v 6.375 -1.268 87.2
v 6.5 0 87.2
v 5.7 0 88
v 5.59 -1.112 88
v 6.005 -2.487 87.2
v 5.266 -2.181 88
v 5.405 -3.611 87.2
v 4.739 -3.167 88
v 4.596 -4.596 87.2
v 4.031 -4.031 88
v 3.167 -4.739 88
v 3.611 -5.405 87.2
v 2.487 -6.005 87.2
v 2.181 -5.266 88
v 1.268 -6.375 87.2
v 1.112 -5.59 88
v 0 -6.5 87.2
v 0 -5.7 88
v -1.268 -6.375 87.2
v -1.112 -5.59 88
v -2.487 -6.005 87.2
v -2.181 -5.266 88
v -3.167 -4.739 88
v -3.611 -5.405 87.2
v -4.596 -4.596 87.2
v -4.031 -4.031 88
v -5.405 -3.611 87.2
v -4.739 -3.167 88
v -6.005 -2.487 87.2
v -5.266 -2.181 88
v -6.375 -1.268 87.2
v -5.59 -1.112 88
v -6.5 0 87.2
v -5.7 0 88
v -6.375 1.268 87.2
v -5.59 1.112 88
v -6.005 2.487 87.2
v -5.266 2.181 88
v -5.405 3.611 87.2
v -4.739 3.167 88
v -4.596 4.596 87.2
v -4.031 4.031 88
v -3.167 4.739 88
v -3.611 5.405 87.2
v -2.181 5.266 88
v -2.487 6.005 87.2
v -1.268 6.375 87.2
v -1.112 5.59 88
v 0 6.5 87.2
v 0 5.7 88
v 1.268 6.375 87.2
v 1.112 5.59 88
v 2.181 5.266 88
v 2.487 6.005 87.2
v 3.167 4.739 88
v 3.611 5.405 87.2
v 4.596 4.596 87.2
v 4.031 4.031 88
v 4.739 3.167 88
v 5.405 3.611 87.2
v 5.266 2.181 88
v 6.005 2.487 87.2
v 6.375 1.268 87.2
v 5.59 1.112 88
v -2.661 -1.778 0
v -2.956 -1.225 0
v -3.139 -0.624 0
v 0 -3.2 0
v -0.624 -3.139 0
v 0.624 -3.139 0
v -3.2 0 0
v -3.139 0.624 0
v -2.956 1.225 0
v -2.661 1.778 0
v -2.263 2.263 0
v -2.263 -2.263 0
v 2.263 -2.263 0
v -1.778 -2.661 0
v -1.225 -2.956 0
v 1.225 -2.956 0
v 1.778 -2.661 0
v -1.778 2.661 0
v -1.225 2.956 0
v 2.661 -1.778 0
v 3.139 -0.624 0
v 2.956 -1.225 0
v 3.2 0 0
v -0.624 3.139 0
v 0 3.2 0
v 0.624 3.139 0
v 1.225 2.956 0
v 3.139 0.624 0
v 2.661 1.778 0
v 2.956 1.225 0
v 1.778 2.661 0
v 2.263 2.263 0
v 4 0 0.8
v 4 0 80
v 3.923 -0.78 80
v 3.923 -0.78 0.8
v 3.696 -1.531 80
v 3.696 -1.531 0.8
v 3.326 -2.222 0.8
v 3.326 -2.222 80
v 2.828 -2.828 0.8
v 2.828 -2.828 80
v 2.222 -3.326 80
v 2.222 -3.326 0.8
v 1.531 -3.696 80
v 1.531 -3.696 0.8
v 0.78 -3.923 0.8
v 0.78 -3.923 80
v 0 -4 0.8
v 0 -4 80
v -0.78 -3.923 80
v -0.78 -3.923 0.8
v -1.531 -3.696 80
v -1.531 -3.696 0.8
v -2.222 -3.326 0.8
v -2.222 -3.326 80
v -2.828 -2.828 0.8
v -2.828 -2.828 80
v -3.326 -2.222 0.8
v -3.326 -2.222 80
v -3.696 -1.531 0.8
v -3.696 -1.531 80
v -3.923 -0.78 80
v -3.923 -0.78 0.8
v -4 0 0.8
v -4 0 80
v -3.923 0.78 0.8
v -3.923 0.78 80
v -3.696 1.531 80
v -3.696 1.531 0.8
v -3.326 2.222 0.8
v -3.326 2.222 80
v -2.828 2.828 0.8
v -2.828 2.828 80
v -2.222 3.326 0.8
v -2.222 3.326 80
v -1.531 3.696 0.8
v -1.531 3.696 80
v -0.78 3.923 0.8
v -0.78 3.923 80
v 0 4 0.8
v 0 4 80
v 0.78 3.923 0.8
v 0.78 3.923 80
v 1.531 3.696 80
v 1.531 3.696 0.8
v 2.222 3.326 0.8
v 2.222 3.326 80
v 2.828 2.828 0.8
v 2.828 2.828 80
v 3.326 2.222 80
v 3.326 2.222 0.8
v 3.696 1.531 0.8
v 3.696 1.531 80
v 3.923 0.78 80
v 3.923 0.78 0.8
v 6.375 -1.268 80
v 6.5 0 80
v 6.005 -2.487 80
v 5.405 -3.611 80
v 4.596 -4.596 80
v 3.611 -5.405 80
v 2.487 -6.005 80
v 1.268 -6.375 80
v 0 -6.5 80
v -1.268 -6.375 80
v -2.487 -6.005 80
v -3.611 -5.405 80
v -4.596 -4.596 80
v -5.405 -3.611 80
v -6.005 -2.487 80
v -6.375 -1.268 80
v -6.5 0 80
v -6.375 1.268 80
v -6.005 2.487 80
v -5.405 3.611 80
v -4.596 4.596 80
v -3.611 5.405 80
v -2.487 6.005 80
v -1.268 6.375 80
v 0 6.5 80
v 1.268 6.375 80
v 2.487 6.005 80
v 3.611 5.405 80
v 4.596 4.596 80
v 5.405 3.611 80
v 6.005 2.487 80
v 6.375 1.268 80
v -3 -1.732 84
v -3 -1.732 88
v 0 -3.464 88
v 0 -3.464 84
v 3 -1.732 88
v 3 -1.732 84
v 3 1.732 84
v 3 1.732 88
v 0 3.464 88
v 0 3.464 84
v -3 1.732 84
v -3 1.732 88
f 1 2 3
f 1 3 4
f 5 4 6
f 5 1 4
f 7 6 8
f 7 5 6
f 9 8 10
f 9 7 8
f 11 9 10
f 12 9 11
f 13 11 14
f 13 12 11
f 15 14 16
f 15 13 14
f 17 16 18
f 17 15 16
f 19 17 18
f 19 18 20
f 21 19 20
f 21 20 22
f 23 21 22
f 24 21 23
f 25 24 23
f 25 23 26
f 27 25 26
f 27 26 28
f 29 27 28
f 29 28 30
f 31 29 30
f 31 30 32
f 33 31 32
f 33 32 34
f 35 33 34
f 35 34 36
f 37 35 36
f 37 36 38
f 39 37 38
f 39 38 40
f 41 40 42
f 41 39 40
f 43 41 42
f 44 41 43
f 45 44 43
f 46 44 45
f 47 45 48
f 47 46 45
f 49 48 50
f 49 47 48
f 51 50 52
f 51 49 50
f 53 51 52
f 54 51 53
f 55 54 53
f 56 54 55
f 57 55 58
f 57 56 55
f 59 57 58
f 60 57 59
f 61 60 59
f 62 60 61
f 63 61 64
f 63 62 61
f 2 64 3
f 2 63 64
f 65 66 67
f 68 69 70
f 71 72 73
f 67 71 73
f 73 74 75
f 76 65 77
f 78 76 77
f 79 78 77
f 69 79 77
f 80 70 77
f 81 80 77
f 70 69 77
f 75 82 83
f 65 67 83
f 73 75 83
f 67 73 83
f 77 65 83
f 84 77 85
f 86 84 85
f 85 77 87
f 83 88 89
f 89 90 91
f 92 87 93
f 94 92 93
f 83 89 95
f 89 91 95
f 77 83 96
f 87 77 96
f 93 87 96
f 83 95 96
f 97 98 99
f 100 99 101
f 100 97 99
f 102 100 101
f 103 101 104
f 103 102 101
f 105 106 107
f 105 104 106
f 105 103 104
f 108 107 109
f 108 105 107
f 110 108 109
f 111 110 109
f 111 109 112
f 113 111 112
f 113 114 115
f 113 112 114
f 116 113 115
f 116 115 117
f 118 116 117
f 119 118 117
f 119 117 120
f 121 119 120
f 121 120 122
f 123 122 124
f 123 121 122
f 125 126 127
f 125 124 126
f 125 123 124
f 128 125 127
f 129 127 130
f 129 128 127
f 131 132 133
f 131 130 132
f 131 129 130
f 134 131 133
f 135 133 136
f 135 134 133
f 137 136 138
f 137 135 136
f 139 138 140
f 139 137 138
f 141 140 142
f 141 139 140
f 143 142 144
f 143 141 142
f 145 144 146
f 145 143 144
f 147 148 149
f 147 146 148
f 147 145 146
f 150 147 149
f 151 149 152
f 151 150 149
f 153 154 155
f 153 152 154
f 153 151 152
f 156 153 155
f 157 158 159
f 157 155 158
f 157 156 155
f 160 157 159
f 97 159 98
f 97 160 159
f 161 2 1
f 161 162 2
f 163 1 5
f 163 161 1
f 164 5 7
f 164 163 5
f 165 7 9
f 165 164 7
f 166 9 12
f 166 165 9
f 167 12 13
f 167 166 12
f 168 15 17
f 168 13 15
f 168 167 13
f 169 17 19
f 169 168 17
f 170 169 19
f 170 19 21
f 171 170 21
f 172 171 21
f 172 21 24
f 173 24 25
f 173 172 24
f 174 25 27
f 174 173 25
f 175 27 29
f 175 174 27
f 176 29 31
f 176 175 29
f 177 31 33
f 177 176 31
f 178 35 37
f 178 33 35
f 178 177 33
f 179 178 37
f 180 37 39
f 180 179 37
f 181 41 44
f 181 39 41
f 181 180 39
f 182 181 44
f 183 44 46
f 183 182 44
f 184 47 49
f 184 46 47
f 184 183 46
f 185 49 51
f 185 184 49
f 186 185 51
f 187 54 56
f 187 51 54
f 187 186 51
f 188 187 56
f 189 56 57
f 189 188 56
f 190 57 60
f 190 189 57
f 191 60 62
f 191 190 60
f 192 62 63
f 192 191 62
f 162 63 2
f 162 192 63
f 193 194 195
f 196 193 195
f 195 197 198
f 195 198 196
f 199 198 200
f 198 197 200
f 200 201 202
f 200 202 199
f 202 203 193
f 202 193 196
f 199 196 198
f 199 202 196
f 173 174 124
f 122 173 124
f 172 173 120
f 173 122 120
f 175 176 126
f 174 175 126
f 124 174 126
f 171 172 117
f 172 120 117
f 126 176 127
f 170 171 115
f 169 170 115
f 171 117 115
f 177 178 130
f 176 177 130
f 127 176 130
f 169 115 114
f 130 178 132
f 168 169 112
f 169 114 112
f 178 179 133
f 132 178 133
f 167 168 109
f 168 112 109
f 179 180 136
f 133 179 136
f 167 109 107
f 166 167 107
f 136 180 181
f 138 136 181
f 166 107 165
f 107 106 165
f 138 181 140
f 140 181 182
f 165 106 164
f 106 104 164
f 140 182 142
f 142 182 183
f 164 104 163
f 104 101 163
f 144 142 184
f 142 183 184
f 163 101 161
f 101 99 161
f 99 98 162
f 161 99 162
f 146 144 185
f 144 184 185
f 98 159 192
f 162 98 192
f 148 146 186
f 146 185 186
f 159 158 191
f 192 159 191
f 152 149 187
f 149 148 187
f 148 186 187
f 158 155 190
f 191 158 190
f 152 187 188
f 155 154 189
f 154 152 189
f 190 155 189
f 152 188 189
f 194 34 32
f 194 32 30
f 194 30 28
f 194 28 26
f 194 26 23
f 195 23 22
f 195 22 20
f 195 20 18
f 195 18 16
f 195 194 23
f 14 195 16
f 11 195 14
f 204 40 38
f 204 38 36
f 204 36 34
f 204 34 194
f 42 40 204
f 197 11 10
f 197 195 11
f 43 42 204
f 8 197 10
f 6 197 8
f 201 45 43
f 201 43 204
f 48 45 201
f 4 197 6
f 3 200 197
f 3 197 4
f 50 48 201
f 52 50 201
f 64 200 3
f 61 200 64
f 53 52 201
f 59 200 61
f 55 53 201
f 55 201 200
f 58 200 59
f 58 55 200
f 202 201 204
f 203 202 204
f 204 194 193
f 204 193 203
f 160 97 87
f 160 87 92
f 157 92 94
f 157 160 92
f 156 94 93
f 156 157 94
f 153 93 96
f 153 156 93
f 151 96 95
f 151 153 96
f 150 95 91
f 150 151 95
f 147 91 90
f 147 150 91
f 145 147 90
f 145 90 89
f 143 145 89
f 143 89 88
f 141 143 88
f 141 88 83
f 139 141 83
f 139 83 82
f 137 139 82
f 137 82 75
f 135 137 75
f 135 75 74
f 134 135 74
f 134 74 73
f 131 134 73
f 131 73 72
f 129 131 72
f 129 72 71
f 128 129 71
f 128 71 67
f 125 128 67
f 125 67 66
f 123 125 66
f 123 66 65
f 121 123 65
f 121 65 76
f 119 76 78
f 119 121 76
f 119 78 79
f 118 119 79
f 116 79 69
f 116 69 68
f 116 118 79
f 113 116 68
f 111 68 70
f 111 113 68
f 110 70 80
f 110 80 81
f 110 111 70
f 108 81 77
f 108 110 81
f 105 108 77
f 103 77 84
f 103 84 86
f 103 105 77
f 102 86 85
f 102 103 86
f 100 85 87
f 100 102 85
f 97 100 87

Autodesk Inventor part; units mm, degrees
ref_plane "YZ Plane" through (0, 0, 0) normal (1, 0, 0) x (0, 1, 0)
ref_plane "XZ Plane" through (0, 0, 0) normal (0, 1, 0) x (-1, 0, 0)
ref_plane "XY Plane" through (0, 0, 0) normal (0, 0, 1) x (1, 0, 0)
sketch "Sketch1" plane through (0, 0, 0) normal (0, 0, 1) x (1, 0, 0)
  circle A0 centre (0, 0) radius 4
  dimension "Diameter" = 8
extrude "Extrusion1" add sketch "Sketch1" along normal blind 80
sketch "Sketch2" plane through (0, 0, 80) normal (0, 0, 1) x (1, 0, 0)
  circle A0 centre (0, 0) radius 4 projected
  circle A1 centre (0, 0) radius 6.5
  dimension "Head_Diameter" = 13
extrude "Extrusion2" add sketch "Sketch2" along normal blind 8 contours A0 | A1
sketch "Sketch3" plane through (0, 0, 88) normal (0, 0, 1) x (1, 0, 0)
  circle A0 centre (0, 0) radius 6.5 projected
  circle A1 centre (0, 0) radius 3.4641 construction
  line L0 (0, 3.4641) -> (3, 1.7321)
  line L1 (3, -1.7321) -> (3, 1.7321)
  line L2 (0, 3.4641) -> (-3, 1.7321)
  line L3 (-3, -1.7321) -> (-3, 1.7321)
  line L4 (-3, -1.7321) -> (0, -3.4641)
  line L5 (3, -1.7321) -> (0, -3.4641)
  dimension "Hex_Width" = 6
extrude "Extrusion3" cut sketch "Sketch3" against normal blind 4 contours L0 L1 L5 L4 L3 L2
thread "Thread1" size "M8x1.25" class "4g6g" standard "ANSI Metric M Profile" length 28
chamfer "Chamfer1" distance 0.8 angle 45 2 edges at (-6.5, 0, 88) (-4, 0, 0)
equation "\"d9\" = ThreadLength"
equation "\"d12\" = Chamfer"
equation "\"ThreadLength\" = 28"
equation "\"Chamfer\" = 0.8"
properties part number "SCREW,SOCKET HD,P,12.9,M8X1.25X80MM"
